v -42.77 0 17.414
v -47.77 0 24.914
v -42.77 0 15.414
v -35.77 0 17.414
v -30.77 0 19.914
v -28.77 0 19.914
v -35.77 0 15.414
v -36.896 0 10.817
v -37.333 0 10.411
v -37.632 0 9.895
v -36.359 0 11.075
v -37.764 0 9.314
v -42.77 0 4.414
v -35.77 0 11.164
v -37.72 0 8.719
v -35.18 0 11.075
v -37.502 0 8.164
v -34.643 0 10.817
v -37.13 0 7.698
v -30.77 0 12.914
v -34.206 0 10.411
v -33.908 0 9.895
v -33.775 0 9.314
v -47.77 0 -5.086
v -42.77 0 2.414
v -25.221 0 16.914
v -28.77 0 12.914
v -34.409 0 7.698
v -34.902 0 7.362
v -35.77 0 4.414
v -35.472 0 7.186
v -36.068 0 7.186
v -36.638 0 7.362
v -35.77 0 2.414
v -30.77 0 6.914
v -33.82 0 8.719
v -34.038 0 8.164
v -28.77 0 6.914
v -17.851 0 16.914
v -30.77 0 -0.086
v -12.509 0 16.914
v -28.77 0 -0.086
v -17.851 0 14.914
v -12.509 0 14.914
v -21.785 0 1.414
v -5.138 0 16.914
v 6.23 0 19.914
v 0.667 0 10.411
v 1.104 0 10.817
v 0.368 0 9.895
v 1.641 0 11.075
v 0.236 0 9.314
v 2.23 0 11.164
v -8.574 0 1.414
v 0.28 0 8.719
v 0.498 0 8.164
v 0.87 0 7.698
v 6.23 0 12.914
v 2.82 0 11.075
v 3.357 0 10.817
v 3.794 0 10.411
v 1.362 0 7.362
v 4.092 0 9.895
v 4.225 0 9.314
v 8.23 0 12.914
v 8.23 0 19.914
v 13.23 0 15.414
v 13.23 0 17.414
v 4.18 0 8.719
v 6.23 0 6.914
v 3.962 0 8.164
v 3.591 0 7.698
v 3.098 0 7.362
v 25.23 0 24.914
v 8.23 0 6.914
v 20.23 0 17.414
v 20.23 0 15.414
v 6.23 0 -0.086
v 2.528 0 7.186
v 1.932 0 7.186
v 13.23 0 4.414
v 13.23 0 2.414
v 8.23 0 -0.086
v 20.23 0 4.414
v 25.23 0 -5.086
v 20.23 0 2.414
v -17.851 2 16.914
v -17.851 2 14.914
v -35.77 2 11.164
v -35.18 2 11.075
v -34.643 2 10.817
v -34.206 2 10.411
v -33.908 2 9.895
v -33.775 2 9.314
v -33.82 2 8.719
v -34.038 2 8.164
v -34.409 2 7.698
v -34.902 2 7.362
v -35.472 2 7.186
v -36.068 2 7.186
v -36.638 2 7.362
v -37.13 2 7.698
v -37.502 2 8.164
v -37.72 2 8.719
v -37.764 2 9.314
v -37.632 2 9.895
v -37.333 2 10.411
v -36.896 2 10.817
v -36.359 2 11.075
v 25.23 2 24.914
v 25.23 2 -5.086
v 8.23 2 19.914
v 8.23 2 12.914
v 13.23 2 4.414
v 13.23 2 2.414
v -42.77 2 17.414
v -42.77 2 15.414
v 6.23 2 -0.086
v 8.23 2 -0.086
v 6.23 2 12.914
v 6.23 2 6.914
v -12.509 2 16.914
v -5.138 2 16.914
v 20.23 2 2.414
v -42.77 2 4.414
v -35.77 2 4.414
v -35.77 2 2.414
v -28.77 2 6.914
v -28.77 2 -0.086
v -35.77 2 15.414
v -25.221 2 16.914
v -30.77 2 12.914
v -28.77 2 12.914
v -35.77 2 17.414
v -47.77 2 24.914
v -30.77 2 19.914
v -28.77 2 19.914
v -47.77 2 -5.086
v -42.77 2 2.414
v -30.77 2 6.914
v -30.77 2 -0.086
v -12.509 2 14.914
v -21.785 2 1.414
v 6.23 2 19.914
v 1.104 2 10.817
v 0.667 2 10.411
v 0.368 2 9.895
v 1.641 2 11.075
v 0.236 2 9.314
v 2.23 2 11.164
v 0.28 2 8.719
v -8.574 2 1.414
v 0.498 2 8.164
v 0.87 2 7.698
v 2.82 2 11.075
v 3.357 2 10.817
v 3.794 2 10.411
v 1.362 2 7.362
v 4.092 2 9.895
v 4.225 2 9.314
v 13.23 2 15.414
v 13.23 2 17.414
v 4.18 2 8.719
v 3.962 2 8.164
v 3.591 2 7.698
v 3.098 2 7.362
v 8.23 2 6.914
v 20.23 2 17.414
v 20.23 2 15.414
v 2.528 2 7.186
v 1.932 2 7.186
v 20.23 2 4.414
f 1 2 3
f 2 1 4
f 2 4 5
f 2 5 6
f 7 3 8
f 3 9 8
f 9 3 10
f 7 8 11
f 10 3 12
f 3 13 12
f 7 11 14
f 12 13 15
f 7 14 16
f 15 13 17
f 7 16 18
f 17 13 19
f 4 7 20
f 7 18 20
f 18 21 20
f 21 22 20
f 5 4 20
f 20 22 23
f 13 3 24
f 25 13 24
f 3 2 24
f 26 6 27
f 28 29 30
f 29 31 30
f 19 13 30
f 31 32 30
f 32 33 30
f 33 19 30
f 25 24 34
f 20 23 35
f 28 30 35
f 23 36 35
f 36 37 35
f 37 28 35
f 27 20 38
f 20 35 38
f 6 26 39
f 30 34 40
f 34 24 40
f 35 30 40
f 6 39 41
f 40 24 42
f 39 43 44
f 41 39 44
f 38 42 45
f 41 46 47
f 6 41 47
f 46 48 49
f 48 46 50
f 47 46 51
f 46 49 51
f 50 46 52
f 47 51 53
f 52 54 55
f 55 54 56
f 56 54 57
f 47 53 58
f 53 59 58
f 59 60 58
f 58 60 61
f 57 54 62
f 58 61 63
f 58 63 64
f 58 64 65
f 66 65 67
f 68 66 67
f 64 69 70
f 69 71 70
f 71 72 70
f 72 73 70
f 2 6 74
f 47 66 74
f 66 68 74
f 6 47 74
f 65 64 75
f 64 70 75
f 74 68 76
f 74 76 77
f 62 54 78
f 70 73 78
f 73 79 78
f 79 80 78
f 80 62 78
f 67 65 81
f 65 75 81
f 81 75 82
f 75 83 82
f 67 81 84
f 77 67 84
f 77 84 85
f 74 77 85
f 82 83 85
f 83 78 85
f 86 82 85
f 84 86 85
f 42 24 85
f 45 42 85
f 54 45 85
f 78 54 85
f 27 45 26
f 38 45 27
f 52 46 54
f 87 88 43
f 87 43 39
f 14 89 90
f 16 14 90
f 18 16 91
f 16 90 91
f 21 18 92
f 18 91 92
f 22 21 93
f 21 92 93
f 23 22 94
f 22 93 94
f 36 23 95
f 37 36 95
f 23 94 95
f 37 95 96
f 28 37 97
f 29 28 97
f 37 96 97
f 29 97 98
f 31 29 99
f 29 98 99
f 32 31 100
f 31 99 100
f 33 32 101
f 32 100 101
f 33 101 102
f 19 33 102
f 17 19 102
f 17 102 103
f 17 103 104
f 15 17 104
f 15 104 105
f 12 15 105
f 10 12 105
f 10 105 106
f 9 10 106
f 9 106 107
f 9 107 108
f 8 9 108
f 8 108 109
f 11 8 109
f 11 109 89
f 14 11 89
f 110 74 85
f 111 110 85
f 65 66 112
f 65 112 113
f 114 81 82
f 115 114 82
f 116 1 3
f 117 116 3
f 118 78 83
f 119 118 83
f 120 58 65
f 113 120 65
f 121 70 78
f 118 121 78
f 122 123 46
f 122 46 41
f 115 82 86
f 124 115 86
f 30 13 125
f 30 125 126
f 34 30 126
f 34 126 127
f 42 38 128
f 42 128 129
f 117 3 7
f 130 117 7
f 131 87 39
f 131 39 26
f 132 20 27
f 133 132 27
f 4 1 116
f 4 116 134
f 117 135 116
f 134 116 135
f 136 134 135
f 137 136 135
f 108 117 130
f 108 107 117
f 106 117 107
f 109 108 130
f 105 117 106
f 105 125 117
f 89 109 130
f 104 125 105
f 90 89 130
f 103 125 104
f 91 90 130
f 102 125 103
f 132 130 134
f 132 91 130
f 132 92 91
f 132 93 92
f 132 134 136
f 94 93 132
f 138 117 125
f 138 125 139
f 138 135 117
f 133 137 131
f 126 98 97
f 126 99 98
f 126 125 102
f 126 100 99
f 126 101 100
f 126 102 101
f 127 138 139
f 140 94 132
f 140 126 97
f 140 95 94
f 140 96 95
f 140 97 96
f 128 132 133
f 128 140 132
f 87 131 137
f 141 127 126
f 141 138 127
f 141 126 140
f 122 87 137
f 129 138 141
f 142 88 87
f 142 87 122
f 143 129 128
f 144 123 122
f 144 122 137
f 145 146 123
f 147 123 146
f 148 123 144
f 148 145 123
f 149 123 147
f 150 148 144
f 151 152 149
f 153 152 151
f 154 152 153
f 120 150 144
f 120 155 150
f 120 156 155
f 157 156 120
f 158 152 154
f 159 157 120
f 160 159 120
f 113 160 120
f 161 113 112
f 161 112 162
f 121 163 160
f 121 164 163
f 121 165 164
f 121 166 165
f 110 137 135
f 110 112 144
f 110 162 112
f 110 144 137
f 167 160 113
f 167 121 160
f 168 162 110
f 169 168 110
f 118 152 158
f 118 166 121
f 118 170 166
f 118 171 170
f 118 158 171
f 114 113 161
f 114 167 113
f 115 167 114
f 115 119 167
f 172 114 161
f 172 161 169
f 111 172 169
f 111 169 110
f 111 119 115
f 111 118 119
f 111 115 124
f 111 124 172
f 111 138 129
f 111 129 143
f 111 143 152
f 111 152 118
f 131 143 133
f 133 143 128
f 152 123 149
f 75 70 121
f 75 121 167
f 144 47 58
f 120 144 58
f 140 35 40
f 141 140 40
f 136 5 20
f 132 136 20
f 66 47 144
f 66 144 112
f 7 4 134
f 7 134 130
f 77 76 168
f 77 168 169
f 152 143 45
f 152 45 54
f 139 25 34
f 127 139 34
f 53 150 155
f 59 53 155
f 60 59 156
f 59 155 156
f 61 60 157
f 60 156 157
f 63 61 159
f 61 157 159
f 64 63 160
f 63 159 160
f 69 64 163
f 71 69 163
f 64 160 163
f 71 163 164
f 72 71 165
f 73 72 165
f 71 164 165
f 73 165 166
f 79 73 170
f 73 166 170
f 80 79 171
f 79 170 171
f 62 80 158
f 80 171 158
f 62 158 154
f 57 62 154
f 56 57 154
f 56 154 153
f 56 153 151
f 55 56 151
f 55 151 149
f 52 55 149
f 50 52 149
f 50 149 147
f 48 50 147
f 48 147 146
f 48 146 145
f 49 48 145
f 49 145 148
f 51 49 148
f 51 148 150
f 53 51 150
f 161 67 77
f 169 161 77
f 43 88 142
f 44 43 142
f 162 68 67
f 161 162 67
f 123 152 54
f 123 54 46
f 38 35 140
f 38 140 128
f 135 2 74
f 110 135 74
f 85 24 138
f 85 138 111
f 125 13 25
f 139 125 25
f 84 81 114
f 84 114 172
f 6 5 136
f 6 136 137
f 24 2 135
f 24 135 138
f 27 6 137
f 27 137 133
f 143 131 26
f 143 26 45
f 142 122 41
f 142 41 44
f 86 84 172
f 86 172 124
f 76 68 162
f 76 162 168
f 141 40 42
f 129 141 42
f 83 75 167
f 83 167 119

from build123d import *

# Parameters (mm, degrees)
SKETCH1_W           = 73
SKETCH1_H           = 30
SKETCH1_W_2         = 7
SKETCH1_H_2         = 2
SKETCH1_W_3         = 2
SKETCH1_H_3         = 7
BOSS_EXTRUDE1_DEPTH = 2
CUT_EXTRUDE1_DEPTH  = 10
SKETCH6_R           = 2
CUT_EXTRUDE2_DEPTH  = 19


with BuildPart() as part:
    # Sketch1 → Boss-Extrude1 (new body)
    with BuildSketch(Plane(origin=(0, 0, 0), x_dir=(1, 0, 0), z_dir=(0, 1, 0))):
        with Locations((-11.269774173, -9.91409445)):
            Rectangle(SKETCH1_W, SKETCH1_H)
        with Locations((-39.269774173, -16.41409445)):
            Rectangle(SKETCH1_W_2, SKETCH1_H_2, mode=Mode.SUBTRACT)
        with Locations((-39.269774173, -3.41409445)):
            Rectangle(SKETCH1_W_2, SKETCH1_H_2, mode=Mode.SUBTRACT)
        with Locations((16.730225827, -3.41409445)):
            Rectangle(SKETCH1_W_2, SKETCH1_H_2, mode=Mode.SUBTRACT)
        with Locations((16.730225827, -16.41409445)):
            Rectangle(SKETCH1_W_2, SKETCH1_H_2, mode=Mode.SUBTRACT)
        with Locations((-29.769774173, -3.41409445)):
            Rectangle(SKETCH1_W_3, SKETCH1_H_3, mode=Mode.SUBTRACT)
        with Locations((-29.769774173, -16.41409445)):
            Rectangle(SKETCH1_W_3, SKETCH1_H_3, mode=Mode.SUBTRACT)
        with Locations((7.230225827, -16.41409445)):
            Rectangle(SKETCH1_W_3, SKETCH1_H_3, mode=Mode.SUBTRACT)
        with Locations((7.230225827, -3.41409445)):
            Rectangle(SKETCH1_W_3, SKETCH1_H_3, mode=Mode.SUBTRACT)
    extrude(amount=BOSS_EXTRUDE1_DEPTH)

    # Sketch3 → Cut-Extrude1 (cut)
    with BuildSketch(Plane(origin=(0, 2, 0), x_dir=(1, 0, 0), z_dir=(0, 1, 0))):
        Polygon((-20.17963908, -3.41409445), (-22.7291277, -14.91409445), (-17.850525272, -14.91409445), (-12.508752888, -14.91409445), (-7.630150459, -14.91409445), (-10.17963908, -3.41409445), align=None)
        Polygon((-5.138202105, -16.91409445), (-12.508752888, -16.91409445), (-12.508752888, -14.91409445), (-7.630150459, -14.91409445), (-10.17963908, -3.41409445), (-20.17963908, -3.41409445), (-22.7291277, -14.91409445), (-17.850525272, -14.91409445), (-17.850525272, -16.91409445), (-25.221076054, -16.91409445), (-21.784808783, -1.41409445), (-8.574469376, -1.41409445), align=None)
    extrude(amount=-CUT_EXTRUDE1_DEPTH, mode=Mode.SUBTRACT)

    # Sketch6 → Cut-Extrude2 (cut)
    with BuildSketch(Plane(origin=(0, 2, 0), x_dir=(1, 0, 0), z_dir=(0, 1, 0))):
        with Locations(Location((-35.769774173, -9.16409445, 0), (0, 0, 270))):
            Circle(SKETCH6_R)
        with Locations(Location((2.230225827, -9.16409445, 0), (0, 0, 270))):
            Circle(SKETCH6_R)
    extrude(amount=-CUT_EXTRUDE2_DEPTH, mode=Mode.SUBTRACT)


solid = part.part
